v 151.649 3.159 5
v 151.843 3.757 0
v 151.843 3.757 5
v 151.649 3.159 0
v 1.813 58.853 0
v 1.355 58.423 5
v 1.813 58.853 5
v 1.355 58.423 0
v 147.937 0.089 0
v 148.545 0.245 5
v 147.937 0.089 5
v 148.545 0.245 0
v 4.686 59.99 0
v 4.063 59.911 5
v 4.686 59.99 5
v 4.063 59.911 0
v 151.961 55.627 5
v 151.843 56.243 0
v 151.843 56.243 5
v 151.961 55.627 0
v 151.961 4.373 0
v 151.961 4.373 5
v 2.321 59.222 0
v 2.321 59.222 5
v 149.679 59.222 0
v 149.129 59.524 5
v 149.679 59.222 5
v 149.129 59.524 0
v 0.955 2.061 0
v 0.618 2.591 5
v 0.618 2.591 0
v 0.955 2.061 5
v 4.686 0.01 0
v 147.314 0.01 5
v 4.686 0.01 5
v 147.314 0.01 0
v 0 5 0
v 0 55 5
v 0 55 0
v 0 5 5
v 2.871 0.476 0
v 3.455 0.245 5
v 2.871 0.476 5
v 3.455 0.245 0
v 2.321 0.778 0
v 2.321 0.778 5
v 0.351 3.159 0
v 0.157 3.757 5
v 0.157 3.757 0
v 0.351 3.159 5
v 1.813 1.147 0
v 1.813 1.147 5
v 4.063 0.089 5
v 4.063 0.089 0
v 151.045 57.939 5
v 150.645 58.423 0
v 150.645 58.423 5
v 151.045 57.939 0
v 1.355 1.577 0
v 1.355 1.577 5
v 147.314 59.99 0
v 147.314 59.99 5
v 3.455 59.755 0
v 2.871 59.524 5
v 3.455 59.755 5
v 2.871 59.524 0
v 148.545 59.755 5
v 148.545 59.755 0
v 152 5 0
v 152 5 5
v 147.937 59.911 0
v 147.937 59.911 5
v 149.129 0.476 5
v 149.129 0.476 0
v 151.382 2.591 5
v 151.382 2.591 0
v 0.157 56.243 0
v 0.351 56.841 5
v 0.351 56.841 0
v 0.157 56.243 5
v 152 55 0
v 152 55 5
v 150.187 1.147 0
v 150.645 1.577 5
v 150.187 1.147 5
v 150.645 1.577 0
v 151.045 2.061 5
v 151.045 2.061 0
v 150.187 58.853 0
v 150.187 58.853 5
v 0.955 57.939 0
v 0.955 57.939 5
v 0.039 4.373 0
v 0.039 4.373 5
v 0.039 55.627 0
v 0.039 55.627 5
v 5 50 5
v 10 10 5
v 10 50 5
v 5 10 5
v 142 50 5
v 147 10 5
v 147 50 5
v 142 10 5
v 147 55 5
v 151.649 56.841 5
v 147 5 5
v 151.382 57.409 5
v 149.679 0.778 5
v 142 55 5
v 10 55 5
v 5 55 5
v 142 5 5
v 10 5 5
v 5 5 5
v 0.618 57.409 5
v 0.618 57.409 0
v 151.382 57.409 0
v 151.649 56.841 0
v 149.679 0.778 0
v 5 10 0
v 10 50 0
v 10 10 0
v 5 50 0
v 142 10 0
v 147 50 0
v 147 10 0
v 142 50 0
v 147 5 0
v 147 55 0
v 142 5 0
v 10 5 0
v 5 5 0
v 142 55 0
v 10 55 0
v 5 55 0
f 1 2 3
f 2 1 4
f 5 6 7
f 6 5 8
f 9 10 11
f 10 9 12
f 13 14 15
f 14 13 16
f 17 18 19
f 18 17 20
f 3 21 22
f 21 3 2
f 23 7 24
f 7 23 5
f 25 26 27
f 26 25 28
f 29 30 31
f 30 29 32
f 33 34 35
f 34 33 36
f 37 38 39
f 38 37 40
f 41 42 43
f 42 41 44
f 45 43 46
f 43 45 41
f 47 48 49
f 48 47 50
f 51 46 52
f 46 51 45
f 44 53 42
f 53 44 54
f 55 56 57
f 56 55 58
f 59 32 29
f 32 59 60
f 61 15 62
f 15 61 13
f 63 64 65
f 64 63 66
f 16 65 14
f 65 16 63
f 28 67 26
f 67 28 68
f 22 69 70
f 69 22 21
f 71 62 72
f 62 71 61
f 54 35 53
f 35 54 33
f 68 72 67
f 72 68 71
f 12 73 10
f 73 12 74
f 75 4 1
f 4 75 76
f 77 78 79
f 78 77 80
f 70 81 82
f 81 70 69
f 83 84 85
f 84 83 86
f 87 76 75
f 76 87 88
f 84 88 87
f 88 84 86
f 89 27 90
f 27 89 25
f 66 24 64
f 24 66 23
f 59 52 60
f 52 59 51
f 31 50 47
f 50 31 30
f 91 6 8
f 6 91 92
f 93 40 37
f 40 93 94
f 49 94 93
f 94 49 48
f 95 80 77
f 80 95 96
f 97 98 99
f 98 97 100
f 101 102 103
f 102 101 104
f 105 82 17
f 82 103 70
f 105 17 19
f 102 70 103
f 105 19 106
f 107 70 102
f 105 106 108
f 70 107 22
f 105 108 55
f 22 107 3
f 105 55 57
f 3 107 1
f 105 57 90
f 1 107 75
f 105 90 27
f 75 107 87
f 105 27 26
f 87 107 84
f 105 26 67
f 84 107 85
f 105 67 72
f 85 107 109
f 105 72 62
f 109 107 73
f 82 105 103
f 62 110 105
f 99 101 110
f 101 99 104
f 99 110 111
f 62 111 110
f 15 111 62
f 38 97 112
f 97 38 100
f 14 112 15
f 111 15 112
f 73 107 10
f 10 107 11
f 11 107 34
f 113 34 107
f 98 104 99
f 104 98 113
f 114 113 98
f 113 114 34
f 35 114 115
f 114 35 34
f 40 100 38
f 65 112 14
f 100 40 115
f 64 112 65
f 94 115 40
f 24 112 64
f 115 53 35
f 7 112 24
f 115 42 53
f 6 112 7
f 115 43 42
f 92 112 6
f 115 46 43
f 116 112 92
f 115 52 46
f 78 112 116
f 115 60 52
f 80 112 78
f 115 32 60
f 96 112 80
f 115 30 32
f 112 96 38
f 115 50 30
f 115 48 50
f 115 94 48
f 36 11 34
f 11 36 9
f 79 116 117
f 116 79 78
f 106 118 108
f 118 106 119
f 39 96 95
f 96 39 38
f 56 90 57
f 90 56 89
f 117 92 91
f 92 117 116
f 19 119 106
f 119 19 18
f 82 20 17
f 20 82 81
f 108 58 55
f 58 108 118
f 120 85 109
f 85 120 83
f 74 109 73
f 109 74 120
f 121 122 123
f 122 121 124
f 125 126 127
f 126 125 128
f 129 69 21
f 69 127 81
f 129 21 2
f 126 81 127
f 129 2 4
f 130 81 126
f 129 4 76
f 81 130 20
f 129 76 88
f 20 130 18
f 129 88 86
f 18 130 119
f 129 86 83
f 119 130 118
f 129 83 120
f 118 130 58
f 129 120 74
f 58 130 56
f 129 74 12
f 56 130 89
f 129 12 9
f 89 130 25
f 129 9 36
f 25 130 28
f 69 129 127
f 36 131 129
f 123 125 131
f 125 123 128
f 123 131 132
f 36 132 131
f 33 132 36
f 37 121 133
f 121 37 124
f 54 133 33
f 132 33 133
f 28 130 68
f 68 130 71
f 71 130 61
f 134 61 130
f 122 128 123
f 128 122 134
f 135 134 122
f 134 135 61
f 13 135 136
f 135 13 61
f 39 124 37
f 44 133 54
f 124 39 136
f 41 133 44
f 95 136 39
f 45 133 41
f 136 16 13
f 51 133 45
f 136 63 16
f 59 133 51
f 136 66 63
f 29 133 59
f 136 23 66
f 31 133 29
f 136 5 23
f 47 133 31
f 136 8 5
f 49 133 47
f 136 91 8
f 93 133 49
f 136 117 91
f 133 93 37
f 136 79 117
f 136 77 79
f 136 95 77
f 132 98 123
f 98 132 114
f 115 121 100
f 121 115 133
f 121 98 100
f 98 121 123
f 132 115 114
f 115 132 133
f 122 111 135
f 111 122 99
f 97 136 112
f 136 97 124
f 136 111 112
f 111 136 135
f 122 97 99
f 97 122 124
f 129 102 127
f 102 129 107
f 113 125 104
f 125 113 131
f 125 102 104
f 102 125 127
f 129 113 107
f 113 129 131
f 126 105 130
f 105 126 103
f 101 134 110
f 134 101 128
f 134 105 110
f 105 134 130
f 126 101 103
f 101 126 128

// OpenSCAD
/*
 * Simple Modular Frame v1.0
 *
 * http://www.thingiverse.com/thing:1902773
 *
 * By: Maxstupo
 */


/* [Frame Settings] */
// (Select what part to generate):
framePart = 1; // [0:3]

// (The width of the plate):
width = 152;

// (The length of the plate):
length = 60;

// (The height of the plate, also used for the stilt generation):
height = 5;

// (The stilt size, and the stilt slot size):
slotSize = 5;

// (The spacing between the edges of the plate and the stilt slots):
spacing = 5;

// (The plate fillet):
fillet = 10;



/* [Frame 2 Settings] */
// (The width between the mount holes from center-to-center):
mountWidth = 20;

// (The length between the mount holes from center-to-center):
mountLength = 40;

// (The diameter of the mount holes):
mountHoleSize = 3;

// (The spacing from the edge of the plate):
mountSpacingFromEdge = 10;


/* [Frame 3 Settings] */
// (The height of the stilt):
stiltHeight = 50;


/* [Misc] */
// (The tolerance to apply to both plates or stilts):
tolerance = 0;

// (The tolerance for the test part #0):
toleranceTest = 0;

$fn=50;

if(framePart == 0) {
    toleranceTest(rodSize=5,rodLength=30,thickness=5,tolerance=toleranceTest);  
    
} else if (framePart == 1) {
    plate(width, length, height, slotSize + tolerance / 2, spacing, fillet);

} else if (framePart == 2) {
    plateWithMotorMountHoles(width, length, height, slotSize + tolerance / 2, spacing, fillet, mountWidth, mountLength, mountHoleSize, mountSpacingFromEdge);

} else if (framePart == 3) {
    stilt(stiltHeight, slotSize - tolerance / 2, height);

}


module toleranceTest(rodSize=5, rodLength=30, thickness=5,tolerance=0){
    // The hole.
    difference(){
        rs=rodSize+(tolerance/2);
        cube([thickness * 2 + rs, thickness * 2 + rs, rodLength / 3]);
        translate([(thickness * 2 + rs) / 2 - rs / 2, (thickness * 2 + rs) / 2 - rs / 2, -1]) cube([rs, rs, rodLength / 3 + 2]);
    }
    
    // The rod.
    translate([thickness * 2 + rodSize + 10, 0, 0]) cube([rodSize - (tolerance / 2), rodLength, rodSize - (tolerance / 2)]);
}

module plate(width=152, length=60, height=5, slotSize=5, spacing=5, fillet=10) {
    r = min(length, fillet);
    
    difference(){
       
        // The plate. 
        if(r > 0){
            hull(){
                translate([(r / 2), (r / 2), 0]) cylinder(h=height, d=r);
                translate([width - (r / 2), (r / 2), 0]) cylinder(h=height, d=r);
                translate([width - (r / 2), length - (r / 2), 0]) cylinder(h=height, d=r);
                translate([(r / 2), length - (r / 2), 0]) cylinder(h=height, d=r);
            }
        }else{
            cube([width, length, height]);
        }
        
        // Stilt holes.
        translate([spacing, spacing, -1]) cube([slotSize, slotSize, height + 2]);
        translate([spacing, length - slotSize - spacing, -1]) cube([slotSize, slotSize, height + 2]);
        translate([width - slotSize - spacing,  spacing, -1]) cube([slotSize, slotSize, height + 2]);
        translate([width - slotSize - spacing, length - slotSize - spacing, -1]) cube([slotSize, slotSize, height + 2]);
    }
}

module plateWithMotorMountHoles(width=152, length=60, height=5, slotSize=5, spacing=5, fillet=10, mountWidth=20,mountLength=40,mountHoleSize=3,mountSpacingFromEdge=5){
    difference(){
        plate(width, length, height, slotSize, spacing, fillet);
        
        translate([mountSpacingFromEdge + mountHoleSize / 2, length / 2 - mountWidth / 2, -1]){
           translate([0, 0, 0]) cylinder(d=mountHoleSize, h=height + 2);
           translate([mountLength, 0, 0]) cylinder(d=mountHoleSize, h=height + 2);
           translate([0, mountWidth, 0]) cylinder(d=mountHoleSize, h=height + 2);
           translate([mountLength, mountWidth, 0]) cylinder(d=mountHoleSize, h=height + 2);
        }
        
        translate([width - mountLength - mountHoleSize / 2 - mountSpacingFromEdge, length / 2 - mountWidth / 2, -1]){
           translate([0, 0, 0]) cylinder(d=mountHoleSize, h=height + 2);
           translate([mountLength, 0, 0]) cylinder(d=mountHoleSize, h=height + 2);
           translate([0, mountWidth, 0]) cylinder(d=mountHoleSize,h=height + 2);
           translate([mountLength, mountWidth, 0]) cylinder(d=mountHoleSize, h=height + 2);
        }
    }
}

module stilt(height=50, size=10, plateHeight=5) {
    union(){
        cube([height+plateHeight, size, size]);
        translate([plateHeight / 2, size, 0]) rightAngleTriangle(a=size, b=size, height=size);
        translate([height+plateHeight/2, size, size]) rotate([0, 180, 0]) rightAngleTriangle(a=size, b=size, height=size);
    }
}


module rightAngleTriangle(a, b, height=1) {
	aCos = cos(90) * a;
	aSin = sin(90) * a;
	polyhedron(
		points=[[0, 0, 0], [b, 0, 0], [aCos, aSin, 0], [0, 0, height], [b, 0, height], [aCos, aSin, height]],
        faces=[[0, 1, 2], [2, 1, 4, 5], [0, 2, 5, 3], [3, 4, 1, 0], [4, 3, 5]]
    );
}
